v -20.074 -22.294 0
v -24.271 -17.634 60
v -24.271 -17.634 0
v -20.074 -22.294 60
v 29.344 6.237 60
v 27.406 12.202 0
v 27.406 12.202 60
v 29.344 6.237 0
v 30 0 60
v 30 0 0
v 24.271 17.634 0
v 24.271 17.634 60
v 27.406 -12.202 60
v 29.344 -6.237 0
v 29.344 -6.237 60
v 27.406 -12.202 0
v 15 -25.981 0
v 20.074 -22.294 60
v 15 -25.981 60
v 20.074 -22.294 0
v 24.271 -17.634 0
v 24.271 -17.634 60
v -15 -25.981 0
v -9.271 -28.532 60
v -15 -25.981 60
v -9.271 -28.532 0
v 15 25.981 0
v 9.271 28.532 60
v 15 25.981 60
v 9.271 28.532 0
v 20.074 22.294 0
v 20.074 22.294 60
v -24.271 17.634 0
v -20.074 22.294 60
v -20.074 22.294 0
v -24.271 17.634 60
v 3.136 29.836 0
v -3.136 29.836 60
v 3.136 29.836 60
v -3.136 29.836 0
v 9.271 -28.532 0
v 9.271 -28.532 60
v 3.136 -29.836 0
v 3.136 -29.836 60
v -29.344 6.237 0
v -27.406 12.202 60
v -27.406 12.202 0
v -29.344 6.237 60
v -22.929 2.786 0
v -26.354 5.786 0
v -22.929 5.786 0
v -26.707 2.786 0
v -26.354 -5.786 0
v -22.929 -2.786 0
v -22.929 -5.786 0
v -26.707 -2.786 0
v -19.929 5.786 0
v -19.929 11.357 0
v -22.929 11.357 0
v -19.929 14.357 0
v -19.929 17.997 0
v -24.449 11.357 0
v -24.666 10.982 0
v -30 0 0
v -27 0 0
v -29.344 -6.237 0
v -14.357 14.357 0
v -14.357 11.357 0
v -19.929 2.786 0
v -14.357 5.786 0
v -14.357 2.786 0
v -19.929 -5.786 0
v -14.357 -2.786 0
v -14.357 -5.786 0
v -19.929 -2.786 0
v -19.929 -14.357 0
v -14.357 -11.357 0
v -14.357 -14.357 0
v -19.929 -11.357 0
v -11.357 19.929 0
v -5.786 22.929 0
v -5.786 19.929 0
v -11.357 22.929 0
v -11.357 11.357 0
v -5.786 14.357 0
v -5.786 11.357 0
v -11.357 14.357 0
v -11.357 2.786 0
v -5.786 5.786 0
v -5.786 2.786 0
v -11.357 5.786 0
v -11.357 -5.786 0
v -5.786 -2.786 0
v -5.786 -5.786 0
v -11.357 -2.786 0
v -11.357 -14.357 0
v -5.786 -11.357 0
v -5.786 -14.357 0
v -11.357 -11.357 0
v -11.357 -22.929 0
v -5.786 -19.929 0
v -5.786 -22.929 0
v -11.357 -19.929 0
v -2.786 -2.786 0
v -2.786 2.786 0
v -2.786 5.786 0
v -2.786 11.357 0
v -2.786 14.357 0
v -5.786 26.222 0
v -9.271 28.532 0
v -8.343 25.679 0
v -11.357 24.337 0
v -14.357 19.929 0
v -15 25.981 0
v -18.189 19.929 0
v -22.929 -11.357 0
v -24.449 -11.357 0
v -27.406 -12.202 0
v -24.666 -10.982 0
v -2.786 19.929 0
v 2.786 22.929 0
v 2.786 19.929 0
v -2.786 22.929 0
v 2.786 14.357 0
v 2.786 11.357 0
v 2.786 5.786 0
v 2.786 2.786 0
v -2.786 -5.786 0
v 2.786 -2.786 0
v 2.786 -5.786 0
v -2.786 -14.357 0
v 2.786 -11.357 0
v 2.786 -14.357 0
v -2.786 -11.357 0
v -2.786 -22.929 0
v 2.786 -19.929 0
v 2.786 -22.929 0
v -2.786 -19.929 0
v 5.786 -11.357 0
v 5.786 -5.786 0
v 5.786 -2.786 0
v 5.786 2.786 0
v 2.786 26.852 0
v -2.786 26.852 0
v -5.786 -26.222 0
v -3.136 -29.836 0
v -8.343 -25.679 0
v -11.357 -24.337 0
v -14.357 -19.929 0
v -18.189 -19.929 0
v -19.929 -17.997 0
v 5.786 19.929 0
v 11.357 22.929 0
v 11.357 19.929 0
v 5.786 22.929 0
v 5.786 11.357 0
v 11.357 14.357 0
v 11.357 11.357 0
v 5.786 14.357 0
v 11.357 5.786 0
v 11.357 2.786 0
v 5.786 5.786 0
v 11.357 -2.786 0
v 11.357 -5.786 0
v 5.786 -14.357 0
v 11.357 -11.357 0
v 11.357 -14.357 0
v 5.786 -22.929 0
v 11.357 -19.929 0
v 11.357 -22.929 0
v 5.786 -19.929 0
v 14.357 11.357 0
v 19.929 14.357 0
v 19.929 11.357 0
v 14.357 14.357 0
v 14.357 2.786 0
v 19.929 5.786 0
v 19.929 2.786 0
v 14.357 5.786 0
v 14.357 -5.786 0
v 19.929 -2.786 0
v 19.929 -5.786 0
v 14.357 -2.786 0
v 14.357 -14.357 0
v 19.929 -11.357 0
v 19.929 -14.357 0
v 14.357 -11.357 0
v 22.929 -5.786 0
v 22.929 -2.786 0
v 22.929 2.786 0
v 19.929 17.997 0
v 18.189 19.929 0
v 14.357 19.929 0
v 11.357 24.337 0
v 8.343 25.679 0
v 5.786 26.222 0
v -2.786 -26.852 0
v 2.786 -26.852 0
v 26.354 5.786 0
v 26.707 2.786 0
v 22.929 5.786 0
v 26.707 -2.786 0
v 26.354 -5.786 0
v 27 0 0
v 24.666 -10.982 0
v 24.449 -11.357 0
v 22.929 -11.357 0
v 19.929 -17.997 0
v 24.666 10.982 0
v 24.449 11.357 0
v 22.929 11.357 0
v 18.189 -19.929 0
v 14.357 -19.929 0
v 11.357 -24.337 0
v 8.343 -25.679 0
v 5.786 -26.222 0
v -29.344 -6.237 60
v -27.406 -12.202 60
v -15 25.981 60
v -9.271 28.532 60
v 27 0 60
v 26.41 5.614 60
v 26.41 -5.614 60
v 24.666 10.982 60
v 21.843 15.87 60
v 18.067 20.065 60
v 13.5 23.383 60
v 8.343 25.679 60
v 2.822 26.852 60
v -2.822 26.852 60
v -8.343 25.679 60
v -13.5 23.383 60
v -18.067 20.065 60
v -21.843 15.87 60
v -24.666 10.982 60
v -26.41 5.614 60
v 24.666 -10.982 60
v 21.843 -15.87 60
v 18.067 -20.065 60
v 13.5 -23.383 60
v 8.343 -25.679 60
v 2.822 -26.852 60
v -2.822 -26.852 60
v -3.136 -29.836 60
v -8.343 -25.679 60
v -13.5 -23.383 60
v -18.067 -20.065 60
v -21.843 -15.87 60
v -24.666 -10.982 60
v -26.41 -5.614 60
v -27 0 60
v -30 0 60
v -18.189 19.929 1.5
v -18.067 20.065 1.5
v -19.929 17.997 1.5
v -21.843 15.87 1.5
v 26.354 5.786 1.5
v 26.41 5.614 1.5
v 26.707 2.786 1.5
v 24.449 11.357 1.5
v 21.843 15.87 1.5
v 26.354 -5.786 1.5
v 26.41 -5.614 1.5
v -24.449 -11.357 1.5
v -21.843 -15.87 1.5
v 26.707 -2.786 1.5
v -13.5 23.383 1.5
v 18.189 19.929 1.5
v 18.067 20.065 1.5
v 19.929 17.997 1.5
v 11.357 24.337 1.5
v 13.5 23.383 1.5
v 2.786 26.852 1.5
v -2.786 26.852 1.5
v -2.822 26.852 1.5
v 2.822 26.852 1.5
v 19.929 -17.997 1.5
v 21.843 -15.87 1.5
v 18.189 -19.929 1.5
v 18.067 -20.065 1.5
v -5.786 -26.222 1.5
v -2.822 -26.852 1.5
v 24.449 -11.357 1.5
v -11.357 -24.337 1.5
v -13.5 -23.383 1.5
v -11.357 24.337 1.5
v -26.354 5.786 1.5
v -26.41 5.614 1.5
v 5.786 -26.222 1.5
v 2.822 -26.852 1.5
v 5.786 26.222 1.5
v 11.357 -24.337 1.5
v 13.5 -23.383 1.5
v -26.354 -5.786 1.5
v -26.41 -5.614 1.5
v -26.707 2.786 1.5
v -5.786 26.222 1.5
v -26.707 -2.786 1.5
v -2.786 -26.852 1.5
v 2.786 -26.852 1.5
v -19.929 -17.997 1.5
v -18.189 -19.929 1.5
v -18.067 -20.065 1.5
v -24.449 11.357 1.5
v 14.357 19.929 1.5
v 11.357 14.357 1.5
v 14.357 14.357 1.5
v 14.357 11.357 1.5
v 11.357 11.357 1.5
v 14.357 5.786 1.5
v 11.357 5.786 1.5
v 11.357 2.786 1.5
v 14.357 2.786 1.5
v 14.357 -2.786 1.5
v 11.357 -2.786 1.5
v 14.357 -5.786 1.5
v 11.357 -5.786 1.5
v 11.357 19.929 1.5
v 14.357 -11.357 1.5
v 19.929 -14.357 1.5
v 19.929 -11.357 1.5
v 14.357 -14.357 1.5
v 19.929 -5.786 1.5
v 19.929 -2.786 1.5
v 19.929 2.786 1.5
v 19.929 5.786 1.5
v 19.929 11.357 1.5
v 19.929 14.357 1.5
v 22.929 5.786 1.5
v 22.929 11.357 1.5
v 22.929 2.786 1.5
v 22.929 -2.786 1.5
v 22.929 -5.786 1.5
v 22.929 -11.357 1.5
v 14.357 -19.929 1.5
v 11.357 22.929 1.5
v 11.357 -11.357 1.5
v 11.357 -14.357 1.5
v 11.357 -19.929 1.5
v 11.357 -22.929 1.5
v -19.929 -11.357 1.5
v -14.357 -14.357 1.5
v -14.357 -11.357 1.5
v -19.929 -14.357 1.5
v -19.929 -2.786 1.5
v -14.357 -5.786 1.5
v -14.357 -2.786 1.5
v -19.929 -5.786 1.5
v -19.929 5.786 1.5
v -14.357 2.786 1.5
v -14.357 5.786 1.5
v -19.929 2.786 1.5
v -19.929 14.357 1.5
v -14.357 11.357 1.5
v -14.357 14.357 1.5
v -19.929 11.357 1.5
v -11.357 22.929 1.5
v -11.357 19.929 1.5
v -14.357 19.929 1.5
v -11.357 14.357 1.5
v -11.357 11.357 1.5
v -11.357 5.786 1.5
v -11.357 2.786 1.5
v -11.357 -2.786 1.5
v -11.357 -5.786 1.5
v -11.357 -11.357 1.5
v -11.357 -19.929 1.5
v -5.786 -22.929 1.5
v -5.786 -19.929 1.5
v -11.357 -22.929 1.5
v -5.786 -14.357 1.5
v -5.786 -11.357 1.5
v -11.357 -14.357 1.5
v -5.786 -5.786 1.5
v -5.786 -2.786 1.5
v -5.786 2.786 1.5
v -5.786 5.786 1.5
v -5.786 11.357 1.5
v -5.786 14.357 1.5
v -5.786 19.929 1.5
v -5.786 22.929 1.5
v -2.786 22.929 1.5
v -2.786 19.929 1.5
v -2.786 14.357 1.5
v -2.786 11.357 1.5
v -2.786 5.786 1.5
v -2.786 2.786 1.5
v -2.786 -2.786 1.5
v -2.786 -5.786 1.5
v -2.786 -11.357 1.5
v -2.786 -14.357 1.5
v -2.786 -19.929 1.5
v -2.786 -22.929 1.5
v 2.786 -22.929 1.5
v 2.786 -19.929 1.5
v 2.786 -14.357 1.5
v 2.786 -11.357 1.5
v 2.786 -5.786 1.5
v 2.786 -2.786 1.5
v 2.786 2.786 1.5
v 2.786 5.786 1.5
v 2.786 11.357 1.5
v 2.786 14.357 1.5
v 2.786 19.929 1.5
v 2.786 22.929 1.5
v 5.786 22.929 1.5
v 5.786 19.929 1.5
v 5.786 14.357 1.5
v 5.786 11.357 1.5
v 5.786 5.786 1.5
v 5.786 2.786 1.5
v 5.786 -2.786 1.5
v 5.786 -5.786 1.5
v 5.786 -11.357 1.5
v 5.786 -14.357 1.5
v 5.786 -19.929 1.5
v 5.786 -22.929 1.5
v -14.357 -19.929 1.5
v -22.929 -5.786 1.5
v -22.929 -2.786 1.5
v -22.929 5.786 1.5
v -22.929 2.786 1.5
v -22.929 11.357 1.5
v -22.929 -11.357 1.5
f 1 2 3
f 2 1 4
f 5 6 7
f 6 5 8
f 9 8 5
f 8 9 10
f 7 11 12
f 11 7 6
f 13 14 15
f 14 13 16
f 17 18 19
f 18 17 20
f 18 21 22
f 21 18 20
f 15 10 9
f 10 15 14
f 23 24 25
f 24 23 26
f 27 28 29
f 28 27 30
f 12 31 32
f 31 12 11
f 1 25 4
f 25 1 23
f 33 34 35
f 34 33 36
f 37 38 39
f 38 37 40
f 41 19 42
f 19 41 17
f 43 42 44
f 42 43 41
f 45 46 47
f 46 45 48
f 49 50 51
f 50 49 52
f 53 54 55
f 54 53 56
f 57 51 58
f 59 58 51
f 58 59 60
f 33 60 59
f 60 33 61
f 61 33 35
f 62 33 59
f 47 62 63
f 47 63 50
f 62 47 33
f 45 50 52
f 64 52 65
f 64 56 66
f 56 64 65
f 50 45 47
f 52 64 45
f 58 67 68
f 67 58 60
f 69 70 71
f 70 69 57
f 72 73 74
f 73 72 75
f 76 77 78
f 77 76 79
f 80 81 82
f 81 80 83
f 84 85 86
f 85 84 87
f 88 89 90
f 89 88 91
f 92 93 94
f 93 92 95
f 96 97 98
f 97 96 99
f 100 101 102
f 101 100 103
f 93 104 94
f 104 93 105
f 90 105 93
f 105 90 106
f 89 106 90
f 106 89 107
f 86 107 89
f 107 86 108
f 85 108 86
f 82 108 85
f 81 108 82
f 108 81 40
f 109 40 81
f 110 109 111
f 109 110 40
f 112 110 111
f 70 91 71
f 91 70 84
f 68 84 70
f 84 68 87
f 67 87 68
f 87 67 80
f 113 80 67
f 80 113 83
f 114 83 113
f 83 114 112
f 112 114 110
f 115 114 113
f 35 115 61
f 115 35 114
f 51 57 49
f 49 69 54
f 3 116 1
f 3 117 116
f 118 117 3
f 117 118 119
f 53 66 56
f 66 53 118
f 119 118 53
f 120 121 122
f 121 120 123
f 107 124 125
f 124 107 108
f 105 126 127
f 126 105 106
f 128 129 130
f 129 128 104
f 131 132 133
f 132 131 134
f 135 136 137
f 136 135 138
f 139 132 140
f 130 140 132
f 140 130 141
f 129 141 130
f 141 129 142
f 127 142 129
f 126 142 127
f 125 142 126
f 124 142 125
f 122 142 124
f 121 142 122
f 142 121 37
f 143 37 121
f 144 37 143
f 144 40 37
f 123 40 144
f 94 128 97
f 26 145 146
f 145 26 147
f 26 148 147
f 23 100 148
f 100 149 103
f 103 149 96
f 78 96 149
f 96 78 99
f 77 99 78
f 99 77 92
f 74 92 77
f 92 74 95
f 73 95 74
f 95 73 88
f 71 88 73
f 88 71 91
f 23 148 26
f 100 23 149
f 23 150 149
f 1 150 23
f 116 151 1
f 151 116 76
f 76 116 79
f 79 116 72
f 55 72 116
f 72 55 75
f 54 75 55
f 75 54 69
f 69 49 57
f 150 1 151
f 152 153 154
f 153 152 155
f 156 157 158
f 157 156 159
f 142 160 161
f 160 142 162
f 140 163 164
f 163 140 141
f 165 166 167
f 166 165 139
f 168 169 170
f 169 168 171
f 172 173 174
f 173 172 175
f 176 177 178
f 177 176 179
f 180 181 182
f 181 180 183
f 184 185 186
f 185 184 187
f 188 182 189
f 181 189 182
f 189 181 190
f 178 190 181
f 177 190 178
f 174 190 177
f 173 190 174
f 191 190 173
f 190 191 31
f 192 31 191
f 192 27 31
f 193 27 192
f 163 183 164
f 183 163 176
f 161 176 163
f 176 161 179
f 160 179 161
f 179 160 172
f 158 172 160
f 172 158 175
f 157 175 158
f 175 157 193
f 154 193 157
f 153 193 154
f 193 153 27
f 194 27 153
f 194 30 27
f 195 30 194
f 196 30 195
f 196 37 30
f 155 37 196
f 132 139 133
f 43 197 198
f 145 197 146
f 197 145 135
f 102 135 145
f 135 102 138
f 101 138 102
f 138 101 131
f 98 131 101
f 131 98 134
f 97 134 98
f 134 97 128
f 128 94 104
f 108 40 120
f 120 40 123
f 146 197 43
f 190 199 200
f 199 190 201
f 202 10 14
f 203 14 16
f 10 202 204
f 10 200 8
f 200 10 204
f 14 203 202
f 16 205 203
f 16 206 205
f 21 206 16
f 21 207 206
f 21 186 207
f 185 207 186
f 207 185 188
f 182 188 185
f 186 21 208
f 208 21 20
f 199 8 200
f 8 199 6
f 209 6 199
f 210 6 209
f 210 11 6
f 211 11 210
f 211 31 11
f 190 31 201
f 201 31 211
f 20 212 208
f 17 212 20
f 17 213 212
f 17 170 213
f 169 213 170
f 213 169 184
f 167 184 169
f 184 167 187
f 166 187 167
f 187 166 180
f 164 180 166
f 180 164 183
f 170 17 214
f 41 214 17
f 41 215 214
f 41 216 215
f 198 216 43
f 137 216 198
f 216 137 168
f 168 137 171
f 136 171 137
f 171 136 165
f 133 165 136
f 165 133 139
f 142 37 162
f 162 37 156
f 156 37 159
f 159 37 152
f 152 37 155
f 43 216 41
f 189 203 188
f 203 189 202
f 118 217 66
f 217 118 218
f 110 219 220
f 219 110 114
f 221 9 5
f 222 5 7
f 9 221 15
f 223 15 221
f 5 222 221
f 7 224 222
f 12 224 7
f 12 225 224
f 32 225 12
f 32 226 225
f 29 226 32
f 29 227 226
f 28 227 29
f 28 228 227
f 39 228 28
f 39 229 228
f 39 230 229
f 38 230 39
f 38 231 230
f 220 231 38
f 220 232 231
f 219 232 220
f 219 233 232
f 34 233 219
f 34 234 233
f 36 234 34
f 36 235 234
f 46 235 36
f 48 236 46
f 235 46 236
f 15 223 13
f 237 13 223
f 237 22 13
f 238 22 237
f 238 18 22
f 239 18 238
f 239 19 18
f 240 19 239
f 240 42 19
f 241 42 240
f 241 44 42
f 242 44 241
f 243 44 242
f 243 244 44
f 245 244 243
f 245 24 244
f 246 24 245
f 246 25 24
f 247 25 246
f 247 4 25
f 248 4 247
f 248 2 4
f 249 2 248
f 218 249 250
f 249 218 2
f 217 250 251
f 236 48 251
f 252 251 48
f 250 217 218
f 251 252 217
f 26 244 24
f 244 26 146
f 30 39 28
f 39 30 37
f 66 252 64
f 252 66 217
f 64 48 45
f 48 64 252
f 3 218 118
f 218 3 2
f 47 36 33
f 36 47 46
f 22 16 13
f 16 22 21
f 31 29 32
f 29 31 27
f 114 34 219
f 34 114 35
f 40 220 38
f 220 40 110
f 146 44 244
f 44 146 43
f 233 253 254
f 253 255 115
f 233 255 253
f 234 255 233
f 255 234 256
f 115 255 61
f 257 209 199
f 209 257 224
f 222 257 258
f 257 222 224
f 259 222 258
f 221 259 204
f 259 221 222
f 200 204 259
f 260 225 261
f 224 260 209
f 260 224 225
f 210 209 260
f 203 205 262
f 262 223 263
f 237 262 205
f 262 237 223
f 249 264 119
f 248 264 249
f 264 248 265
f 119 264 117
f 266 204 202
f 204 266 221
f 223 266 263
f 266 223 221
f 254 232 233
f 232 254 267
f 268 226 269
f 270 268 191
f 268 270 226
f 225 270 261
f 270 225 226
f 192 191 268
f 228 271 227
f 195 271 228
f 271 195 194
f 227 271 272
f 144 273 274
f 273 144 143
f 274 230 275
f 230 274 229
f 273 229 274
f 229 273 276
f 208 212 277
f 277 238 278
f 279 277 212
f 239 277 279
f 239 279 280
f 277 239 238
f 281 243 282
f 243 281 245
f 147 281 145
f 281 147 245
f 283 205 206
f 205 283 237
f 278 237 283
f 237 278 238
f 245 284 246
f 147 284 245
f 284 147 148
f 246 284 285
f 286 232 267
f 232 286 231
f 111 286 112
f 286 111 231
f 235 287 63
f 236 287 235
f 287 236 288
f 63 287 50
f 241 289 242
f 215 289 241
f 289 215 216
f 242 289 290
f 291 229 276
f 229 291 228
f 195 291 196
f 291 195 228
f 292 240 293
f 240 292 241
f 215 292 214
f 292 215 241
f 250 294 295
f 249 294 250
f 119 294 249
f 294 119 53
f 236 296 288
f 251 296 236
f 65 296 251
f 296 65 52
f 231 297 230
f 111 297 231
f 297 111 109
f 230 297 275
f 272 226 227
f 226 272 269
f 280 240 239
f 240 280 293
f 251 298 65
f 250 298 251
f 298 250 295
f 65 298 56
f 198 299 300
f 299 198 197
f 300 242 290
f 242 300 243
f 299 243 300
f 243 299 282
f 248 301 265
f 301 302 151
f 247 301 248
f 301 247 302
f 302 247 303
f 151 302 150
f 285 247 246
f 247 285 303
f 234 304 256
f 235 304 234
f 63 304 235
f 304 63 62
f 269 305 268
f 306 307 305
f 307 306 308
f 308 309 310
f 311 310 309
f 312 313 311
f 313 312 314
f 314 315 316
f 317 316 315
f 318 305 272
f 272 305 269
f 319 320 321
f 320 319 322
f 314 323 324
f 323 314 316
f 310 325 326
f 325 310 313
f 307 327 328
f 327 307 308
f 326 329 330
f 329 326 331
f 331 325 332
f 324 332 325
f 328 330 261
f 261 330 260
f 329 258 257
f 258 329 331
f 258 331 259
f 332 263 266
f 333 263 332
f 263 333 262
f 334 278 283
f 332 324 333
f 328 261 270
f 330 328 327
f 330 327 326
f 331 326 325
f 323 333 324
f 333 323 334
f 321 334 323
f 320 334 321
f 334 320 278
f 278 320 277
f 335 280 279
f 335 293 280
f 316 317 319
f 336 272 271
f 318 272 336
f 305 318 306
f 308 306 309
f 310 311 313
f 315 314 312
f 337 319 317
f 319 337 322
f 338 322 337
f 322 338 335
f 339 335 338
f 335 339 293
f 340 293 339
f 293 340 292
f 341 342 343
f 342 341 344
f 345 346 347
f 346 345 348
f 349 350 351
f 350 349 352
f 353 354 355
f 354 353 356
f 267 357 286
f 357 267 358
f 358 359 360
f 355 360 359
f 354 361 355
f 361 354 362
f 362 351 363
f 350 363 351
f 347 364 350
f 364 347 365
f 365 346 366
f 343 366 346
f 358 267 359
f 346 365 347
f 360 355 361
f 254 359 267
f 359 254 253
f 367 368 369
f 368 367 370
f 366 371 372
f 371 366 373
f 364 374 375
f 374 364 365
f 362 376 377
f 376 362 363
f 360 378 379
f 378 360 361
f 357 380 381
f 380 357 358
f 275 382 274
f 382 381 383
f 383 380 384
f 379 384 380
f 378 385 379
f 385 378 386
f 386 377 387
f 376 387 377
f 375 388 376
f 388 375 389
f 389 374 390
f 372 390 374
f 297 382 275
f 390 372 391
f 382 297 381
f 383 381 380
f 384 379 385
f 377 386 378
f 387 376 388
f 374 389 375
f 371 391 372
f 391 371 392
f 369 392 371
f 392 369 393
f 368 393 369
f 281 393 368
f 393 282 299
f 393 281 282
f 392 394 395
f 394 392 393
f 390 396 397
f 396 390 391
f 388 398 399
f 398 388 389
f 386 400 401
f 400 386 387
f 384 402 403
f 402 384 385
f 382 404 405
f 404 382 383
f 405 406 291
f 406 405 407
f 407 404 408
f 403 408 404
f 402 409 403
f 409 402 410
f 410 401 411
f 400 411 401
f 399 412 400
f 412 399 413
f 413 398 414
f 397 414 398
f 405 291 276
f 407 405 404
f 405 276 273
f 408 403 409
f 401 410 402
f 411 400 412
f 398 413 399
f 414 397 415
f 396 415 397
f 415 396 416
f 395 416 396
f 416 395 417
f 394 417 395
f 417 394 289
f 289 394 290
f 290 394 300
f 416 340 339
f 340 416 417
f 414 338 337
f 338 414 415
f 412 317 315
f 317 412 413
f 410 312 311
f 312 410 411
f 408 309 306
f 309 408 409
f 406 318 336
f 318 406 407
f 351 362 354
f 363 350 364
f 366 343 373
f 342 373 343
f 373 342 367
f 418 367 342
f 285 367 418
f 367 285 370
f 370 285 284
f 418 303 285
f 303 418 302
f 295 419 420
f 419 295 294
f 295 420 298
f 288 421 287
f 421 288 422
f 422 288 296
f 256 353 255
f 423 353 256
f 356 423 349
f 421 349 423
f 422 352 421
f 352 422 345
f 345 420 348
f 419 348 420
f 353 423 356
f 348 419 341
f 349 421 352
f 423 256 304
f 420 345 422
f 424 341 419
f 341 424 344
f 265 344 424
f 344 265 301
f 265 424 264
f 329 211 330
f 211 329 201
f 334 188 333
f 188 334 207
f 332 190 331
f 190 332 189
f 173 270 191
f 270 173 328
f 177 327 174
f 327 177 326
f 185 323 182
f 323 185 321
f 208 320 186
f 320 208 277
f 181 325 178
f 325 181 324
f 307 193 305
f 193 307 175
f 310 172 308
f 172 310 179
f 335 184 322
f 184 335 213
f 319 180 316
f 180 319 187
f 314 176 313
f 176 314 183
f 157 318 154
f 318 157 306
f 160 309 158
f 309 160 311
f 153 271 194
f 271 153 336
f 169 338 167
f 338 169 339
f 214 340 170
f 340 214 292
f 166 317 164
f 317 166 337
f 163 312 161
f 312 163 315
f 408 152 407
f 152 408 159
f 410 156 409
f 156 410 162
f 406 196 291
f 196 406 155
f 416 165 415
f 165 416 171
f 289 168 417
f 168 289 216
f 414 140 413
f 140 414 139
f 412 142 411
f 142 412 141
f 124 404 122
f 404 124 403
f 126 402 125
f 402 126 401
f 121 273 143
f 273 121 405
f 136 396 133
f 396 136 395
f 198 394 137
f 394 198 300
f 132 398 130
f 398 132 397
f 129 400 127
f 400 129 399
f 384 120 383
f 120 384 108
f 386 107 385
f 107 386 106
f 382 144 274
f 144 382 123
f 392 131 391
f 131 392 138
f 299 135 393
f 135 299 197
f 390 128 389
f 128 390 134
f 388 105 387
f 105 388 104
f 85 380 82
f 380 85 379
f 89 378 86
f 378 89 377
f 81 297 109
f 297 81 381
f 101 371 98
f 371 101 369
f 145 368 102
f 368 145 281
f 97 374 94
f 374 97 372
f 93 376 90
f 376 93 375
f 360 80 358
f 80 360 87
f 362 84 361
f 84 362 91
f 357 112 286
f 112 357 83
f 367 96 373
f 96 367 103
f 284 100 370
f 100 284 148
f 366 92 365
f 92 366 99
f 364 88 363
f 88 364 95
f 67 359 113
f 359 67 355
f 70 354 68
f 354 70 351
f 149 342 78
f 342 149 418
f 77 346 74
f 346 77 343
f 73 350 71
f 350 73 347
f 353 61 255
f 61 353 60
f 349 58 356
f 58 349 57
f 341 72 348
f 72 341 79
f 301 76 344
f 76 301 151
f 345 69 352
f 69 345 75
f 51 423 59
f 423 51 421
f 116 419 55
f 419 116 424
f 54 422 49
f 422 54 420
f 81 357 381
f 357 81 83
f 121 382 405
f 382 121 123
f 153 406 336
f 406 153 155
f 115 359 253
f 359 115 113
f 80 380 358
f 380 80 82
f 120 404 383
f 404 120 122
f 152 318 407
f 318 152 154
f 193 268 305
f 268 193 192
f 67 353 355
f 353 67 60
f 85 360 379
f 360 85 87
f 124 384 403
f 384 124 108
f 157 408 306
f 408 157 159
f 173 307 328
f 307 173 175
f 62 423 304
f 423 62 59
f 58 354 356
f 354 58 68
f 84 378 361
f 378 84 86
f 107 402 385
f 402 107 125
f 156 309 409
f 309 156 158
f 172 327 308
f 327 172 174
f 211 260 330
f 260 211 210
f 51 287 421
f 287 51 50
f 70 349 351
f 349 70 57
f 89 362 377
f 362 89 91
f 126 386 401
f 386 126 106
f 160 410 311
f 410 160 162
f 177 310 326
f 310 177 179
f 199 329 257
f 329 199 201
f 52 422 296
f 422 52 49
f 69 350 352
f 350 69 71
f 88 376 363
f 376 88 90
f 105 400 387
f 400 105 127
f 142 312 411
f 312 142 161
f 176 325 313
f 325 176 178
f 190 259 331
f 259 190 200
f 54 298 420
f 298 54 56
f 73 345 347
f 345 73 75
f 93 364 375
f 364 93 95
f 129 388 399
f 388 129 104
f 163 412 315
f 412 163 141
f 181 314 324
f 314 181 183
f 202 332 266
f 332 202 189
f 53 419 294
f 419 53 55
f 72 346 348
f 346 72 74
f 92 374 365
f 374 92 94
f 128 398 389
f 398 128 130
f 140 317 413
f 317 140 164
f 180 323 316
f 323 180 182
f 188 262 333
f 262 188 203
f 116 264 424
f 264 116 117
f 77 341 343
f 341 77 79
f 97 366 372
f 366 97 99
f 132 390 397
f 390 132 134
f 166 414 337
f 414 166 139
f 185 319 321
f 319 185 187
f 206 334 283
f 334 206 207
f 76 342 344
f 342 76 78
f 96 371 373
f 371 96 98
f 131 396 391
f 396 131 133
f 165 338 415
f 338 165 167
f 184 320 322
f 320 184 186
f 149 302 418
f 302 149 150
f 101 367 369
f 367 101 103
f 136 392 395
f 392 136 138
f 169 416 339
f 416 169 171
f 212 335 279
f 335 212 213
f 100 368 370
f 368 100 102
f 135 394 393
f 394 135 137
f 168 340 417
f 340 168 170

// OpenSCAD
n_grid=7;

union(){
	difference(){
		cylinder(r=30,h=60);
		translate([0,0,-1]) cylinder(r=27,h=62);
	}
	intersection(){
		cylinder(r=30,h=60);
		union(){
			for(i=[0:n_grid]) translate([60/n_grid*(n_grid/2-i),0,0]) cube([3,60,3],center=true);
			for(i=[0:n_grid]) translate([0,60/n_grid*(n_grid/2-i),0]) cube([60,3,3],center=true);
		}
	}
}
